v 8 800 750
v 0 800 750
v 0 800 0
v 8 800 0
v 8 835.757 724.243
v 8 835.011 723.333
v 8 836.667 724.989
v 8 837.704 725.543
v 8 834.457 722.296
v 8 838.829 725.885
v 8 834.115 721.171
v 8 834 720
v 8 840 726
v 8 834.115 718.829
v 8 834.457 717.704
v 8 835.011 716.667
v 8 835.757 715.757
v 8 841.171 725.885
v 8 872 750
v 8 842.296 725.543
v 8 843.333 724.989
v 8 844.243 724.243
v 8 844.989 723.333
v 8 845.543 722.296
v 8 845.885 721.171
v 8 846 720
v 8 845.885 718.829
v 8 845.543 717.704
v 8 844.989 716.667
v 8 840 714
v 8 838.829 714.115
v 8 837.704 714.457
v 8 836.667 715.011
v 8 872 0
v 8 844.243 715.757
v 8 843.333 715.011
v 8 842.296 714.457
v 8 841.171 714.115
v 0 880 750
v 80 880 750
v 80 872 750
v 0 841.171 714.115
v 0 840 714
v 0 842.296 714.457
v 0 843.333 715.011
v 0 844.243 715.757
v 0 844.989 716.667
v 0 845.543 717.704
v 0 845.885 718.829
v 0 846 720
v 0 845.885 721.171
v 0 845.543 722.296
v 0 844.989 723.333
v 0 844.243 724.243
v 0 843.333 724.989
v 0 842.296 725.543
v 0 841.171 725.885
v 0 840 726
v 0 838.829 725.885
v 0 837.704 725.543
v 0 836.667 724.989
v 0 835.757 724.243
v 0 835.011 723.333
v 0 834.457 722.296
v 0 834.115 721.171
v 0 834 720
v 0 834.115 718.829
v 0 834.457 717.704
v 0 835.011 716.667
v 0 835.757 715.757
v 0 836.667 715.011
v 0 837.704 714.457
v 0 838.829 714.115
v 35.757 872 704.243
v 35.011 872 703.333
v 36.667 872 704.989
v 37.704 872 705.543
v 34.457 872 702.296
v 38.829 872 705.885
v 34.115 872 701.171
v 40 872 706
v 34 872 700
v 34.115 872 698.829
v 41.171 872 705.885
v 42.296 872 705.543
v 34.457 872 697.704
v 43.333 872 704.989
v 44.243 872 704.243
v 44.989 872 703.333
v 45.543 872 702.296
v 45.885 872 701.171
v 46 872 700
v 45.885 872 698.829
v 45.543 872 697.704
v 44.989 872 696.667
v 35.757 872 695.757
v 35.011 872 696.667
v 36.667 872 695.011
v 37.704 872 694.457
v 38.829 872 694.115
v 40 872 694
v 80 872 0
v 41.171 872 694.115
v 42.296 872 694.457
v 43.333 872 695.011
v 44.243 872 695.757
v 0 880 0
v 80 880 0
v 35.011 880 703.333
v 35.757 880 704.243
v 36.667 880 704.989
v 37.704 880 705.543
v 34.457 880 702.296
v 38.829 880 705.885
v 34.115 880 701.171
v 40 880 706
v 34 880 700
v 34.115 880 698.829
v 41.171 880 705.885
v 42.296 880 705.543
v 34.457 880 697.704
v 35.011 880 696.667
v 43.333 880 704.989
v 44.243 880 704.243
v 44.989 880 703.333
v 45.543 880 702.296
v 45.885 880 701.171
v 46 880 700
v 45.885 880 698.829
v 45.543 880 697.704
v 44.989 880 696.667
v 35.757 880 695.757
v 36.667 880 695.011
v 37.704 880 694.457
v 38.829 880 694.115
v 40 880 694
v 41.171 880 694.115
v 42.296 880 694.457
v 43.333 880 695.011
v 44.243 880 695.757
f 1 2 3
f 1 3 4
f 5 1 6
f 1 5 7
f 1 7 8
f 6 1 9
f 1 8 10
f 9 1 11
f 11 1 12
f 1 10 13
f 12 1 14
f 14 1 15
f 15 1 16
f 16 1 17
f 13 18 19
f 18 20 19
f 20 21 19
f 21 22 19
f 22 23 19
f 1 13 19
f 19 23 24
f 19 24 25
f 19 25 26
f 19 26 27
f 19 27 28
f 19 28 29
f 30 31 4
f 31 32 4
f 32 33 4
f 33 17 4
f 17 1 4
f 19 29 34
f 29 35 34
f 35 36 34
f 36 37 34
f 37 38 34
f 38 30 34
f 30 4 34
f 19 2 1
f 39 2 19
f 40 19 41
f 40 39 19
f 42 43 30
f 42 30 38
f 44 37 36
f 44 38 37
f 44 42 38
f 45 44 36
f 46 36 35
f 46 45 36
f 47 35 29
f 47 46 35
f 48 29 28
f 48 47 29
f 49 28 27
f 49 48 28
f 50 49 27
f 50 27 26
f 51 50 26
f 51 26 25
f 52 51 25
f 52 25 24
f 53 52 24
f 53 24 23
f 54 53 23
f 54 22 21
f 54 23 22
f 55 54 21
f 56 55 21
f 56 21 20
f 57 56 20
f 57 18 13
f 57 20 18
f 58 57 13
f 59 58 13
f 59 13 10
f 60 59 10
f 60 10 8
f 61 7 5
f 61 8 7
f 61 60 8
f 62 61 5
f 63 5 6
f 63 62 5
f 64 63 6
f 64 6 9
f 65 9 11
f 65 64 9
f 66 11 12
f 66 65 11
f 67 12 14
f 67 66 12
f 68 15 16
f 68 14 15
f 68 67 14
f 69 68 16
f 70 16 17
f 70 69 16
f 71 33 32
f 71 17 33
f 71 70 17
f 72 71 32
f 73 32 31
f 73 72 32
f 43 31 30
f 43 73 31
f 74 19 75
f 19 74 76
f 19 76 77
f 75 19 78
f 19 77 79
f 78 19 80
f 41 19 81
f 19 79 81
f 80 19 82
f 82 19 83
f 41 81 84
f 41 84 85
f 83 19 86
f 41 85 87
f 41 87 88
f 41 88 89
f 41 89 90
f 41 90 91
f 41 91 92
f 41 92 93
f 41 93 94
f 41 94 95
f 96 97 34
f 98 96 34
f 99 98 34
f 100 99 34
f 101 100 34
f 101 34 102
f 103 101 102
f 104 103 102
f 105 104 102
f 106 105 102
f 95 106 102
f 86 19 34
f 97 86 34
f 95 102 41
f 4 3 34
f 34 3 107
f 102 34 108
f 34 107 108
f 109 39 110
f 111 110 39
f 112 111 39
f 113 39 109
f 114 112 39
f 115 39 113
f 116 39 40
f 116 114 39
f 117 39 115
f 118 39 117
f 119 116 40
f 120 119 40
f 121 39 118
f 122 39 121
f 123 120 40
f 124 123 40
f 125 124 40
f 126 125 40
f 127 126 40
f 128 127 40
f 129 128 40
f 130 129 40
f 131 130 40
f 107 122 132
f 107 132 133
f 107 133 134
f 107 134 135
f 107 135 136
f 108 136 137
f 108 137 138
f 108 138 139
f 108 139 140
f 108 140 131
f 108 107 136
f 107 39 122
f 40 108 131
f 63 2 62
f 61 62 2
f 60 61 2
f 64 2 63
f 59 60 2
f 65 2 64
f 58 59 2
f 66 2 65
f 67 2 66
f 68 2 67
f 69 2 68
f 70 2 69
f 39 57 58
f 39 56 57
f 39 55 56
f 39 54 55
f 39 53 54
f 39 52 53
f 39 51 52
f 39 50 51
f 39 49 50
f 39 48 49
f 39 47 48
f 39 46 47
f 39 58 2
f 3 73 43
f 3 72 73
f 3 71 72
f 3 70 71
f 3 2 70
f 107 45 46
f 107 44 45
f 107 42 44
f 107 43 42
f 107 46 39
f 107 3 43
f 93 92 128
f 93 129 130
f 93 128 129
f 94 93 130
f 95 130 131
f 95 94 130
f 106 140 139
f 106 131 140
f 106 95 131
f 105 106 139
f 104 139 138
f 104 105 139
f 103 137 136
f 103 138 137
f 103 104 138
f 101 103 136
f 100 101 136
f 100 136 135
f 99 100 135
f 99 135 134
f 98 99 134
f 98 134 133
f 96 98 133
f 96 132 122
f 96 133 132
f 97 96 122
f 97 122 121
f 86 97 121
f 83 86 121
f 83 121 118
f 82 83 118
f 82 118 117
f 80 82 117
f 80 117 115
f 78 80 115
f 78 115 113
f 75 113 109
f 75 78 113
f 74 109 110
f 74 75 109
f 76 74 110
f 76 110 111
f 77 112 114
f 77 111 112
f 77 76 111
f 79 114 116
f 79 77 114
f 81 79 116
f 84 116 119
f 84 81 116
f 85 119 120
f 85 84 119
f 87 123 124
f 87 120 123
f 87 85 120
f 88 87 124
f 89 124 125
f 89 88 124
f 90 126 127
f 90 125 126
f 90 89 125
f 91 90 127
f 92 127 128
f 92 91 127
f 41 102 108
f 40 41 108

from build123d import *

# Parameters (mm, degrees)
CYLINDER001_R           = 6
CYLINDER001_DEPTH       = 1300
CYLINDER001_PITCH_ANGLE = 90
CYLINDER002_R           = 6
CYLINDER002_DEPTH       = 900
CYLINDER002_ROLL_ANGLE  = -90
BOX003_W                = 80
BOX003_H                = 80
BOX003_DEPTH            = 750
BOX002_W                = 80
BOX002_H                = 80
BOX002_DEPTH            = 750


with BuildPart() as cylinder001:
    # Cylinder001 → Cylinder001 (new body)
    with BuildSketch(Plane.XY):
        Circle(CYLINDER001_R)
    extrude(amount=CYLINDER001_DEPTH)


with BuildPart() as cylinder001_1:
    # Cylinder001 pitch: moved
    add(cylinder001.part.rotate(Axis((0, 0, 0), (0, 1, 0)), CYLINDER001_PITCH_ANGLE))


with BuildPart() as cylinder001_2:
    # Cylinder001 placement: moved
    add(cylinder001_1.part.moved(Location((-10, 840, 720))))


with BuildPart() as cylinder002:
    # Cylinder002 → Cylinder002 (new body)
    with BuildSketch(Plane.XY):
        Circle(CYLINDER002_R)
    extrude(amount=CYLINDER002_DEPTH)


with BuildPart() as cylinder002_1:
    # Cylinder002 roll: moved
    add(cylinder002.part.rotate(Axis((0, 0, 0), (1, 0, 0)), CYLINDER002_ROLL_ANGLE))


with BuildPart() as cylinder002_2:
    # Cylinder002 placement: moved
    add(cylinder002_1.part.moved(Location((40, -10, 700))))


with BuildPart() as cube003:
    # Box003 → Box003 (new body)
    with BuildSketch(Plane(origin=(8, 792, 0), x_dir=(1, 0, 0), z_dir=(0, 0, 1))):
        with Locations((40, 40)):
            Rectangle(BOX003_W, BOX003_H)
    extrude(amount=BOX003_DEPTH)


with BuildPart() as cut008:
    # Box002 → Box002 (new body)
    with BuildSketch(Plane(origin=(0, 800, 0), x_dir=(1, 0, 0), z_dir=(0, 0, 1))):
        with Locations((40, 40)):
            Rectangle(BOX002_W, BOX002_H)
    extrude(amount=BOX002_DEPTH)

    # Cut001: cut Cube003
    add(cube003.part, mode=Mode.SUBTRACT)

    # Cut007: cut Cylinder002
    add(cylinder002_2.part, mode=Mode.SUBTRACT)

    # Cut008: cut Cylinder001
    add(cylinder001_2.part, mode=Mode.SUBTRACT)


solid = cut008.part
